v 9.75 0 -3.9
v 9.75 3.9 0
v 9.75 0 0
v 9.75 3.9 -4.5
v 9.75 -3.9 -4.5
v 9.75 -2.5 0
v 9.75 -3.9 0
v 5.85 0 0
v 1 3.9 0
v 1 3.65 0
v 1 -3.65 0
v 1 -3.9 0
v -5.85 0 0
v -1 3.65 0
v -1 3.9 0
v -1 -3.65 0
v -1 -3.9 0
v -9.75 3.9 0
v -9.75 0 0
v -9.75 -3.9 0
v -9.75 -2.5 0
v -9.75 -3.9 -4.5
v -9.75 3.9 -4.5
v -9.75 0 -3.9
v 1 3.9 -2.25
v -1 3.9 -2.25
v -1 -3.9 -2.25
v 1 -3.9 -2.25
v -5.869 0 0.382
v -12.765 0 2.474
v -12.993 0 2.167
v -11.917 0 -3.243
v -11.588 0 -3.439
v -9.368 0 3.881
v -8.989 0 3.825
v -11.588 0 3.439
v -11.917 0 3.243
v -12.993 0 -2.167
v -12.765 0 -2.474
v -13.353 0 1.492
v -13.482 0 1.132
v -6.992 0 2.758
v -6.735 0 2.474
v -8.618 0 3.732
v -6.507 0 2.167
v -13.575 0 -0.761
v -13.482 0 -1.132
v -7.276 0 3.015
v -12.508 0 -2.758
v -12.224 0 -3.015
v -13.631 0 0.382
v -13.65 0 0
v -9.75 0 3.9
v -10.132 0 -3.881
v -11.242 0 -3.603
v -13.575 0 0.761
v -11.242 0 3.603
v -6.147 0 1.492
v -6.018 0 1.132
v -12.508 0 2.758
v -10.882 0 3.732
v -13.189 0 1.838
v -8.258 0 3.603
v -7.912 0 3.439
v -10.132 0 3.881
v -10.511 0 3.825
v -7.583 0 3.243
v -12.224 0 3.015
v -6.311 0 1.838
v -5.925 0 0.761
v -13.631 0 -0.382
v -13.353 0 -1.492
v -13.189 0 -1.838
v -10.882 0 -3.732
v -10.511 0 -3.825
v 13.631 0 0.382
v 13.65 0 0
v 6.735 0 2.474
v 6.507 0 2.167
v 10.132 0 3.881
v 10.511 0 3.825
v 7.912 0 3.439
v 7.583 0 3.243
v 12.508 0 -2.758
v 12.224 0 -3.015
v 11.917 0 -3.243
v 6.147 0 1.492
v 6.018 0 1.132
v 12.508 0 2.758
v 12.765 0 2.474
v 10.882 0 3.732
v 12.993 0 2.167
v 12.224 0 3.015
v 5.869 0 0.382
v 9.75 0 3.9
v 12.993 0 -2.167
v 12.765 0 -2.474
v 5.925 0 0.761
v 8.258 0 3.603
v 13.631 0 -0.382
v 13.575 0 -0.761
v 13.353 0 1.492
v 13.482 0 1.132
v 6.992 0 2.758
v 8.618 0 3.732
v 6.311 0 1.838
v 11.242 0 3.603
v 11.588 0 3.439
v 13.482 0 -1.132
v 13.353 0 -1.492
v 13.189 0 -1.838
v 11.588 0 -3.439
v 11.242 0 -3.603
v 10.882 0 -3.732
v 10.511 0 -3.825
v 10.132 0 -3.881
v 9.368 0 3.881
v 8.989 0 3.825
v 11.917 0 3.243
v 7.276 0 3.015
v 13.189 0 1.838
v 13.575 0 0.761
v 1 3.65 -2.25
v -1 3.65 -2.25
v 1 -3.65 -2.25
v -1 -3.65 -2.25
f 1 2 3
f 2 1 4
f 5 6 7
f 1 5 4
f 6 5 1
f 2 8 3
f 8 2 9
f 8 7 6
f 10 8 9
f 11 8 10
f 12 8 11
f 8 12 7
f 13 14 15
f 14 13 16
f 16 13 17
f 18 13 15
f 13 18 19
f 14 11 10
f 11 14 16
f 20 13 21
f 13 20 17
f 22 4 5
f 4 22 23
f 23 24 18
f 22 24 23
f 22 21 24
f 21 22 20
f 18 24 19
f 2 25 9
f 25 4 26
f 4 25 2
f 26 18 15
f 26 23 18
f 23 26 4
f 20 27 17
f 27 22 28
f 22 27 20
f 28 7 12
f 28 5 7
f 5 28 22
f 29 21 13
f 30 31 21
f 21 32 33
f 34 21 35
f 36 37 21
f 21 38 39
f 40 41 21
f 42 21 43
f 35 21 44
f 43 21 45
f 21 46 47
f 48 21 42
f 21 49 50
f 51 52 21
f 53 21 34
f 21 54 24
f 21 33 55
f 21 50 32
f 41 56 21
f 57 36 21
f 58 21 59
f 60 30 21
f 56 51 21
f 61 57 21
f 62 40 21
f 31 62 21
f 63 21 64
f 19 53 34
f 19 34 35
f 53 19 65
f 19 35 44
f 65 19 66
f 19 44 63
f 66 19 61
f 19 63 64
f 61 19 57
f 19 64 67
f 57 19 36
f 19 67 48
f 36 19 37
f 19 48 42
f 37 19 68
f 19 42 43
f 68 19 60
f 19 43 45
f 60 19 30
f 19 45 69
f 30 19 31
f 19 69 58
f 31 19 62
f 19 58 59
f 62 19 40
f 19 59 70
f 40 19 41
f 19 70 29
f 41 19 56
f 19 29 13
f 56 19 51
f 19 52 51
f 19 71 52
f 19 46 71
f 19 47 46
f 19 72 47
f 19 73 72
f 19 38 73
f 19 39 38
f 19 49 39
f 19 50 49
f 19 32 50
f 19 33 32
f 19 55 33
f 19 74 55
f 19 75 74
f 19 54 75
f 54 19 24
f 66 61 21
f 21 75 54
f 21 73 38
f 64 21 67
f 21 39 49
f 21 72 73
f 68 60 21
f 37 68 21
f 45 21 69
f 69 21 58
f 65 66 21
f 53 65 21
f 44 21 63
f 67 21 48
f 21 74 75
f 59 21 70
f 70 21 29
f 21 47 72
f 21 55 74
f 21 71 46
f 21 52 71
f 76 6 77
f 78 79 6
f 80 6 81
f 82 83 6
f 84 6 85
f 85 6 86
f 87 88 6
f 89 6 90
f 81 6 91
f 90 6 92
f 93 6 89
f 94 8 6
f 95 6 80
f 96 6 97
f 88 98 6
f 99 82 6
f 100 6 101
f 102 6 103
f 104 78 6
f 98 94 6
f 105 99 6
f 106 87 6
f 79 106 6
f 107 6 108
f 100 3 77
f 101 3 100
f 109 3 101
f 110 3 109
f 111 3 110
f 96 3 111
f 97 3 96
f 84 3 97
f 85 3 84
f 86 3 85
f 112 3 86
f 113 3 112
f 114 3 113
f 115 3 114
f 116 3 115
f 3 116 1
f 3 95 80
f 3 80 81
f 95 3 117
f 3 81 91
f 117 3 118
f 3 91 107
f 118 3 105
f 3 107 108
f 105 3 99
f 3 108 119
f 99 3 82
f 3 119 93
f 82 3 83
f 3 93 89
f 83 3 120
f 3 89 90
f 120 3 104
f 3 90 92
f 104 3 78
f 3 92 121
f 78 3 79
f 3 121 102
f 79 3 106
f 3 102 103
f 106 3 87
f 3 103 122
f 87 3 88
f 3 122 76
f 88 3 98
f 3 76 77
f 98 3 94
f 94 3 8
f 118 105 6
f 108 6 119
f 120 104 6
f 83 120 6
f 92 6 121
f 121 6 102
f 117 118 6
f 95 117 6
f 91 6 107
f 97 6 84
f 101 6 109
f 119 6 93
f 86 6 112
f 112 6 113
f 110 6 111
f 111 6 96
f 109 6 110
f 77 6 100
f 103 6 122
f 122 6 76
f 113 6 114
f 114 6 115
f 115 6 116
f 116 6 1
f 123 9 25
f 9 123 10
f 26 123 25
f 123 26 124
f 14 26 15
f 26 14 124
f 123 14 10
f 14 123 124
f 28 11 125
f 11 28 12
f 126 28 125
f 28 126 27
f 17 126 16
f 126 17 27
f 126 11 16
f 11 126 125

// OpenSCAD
module pointed_connector() {
    // Main body dimensions
    length = 24.5;
    width = 7.8;
    height = 4.5;
    slot_length = 20;
    slot_width = 3;
    notch_depth = 0.5;
    notch_width = 2;
    tip_length = 2.5;
    
    // Create the main body with conical tips
    difference() {
        union() {
            // Central body
            translate([0, 0, -height/2])
                cube([length - 2*tip_length, width, height], center=true);
            
            // Conical tips
            translate([-(length/2 - tip_length), 0, 0])
                rotate([90, 0, 0])
                cylinder(h=tip_length, r1=width/2, r2=0, $fn=64);
            translate([(length/2 - tip_length), 0, 0])
                rotate([90, 0, 0])
                cylinder(h=tip_length, r1=width/2, r2=0, $fn=64);
        }
        
        // Central slot (obround)
        translate([0, 0, -height])
            rotate([90, 0, 0])
            offset(r=slot_width/2)
            translate([-slot_length/2, -slot_width/2])
            square([slot_length, slot_width], center=false);
        
        // Side notches
        translate([0, width/2, 0])
            cube([notch_width, notch_depth, height], center=true);
        translate([0, -width/2, 0])
            cube([notch_width, notch_depth, height], center=true);
    }
}

pointed_connector();
